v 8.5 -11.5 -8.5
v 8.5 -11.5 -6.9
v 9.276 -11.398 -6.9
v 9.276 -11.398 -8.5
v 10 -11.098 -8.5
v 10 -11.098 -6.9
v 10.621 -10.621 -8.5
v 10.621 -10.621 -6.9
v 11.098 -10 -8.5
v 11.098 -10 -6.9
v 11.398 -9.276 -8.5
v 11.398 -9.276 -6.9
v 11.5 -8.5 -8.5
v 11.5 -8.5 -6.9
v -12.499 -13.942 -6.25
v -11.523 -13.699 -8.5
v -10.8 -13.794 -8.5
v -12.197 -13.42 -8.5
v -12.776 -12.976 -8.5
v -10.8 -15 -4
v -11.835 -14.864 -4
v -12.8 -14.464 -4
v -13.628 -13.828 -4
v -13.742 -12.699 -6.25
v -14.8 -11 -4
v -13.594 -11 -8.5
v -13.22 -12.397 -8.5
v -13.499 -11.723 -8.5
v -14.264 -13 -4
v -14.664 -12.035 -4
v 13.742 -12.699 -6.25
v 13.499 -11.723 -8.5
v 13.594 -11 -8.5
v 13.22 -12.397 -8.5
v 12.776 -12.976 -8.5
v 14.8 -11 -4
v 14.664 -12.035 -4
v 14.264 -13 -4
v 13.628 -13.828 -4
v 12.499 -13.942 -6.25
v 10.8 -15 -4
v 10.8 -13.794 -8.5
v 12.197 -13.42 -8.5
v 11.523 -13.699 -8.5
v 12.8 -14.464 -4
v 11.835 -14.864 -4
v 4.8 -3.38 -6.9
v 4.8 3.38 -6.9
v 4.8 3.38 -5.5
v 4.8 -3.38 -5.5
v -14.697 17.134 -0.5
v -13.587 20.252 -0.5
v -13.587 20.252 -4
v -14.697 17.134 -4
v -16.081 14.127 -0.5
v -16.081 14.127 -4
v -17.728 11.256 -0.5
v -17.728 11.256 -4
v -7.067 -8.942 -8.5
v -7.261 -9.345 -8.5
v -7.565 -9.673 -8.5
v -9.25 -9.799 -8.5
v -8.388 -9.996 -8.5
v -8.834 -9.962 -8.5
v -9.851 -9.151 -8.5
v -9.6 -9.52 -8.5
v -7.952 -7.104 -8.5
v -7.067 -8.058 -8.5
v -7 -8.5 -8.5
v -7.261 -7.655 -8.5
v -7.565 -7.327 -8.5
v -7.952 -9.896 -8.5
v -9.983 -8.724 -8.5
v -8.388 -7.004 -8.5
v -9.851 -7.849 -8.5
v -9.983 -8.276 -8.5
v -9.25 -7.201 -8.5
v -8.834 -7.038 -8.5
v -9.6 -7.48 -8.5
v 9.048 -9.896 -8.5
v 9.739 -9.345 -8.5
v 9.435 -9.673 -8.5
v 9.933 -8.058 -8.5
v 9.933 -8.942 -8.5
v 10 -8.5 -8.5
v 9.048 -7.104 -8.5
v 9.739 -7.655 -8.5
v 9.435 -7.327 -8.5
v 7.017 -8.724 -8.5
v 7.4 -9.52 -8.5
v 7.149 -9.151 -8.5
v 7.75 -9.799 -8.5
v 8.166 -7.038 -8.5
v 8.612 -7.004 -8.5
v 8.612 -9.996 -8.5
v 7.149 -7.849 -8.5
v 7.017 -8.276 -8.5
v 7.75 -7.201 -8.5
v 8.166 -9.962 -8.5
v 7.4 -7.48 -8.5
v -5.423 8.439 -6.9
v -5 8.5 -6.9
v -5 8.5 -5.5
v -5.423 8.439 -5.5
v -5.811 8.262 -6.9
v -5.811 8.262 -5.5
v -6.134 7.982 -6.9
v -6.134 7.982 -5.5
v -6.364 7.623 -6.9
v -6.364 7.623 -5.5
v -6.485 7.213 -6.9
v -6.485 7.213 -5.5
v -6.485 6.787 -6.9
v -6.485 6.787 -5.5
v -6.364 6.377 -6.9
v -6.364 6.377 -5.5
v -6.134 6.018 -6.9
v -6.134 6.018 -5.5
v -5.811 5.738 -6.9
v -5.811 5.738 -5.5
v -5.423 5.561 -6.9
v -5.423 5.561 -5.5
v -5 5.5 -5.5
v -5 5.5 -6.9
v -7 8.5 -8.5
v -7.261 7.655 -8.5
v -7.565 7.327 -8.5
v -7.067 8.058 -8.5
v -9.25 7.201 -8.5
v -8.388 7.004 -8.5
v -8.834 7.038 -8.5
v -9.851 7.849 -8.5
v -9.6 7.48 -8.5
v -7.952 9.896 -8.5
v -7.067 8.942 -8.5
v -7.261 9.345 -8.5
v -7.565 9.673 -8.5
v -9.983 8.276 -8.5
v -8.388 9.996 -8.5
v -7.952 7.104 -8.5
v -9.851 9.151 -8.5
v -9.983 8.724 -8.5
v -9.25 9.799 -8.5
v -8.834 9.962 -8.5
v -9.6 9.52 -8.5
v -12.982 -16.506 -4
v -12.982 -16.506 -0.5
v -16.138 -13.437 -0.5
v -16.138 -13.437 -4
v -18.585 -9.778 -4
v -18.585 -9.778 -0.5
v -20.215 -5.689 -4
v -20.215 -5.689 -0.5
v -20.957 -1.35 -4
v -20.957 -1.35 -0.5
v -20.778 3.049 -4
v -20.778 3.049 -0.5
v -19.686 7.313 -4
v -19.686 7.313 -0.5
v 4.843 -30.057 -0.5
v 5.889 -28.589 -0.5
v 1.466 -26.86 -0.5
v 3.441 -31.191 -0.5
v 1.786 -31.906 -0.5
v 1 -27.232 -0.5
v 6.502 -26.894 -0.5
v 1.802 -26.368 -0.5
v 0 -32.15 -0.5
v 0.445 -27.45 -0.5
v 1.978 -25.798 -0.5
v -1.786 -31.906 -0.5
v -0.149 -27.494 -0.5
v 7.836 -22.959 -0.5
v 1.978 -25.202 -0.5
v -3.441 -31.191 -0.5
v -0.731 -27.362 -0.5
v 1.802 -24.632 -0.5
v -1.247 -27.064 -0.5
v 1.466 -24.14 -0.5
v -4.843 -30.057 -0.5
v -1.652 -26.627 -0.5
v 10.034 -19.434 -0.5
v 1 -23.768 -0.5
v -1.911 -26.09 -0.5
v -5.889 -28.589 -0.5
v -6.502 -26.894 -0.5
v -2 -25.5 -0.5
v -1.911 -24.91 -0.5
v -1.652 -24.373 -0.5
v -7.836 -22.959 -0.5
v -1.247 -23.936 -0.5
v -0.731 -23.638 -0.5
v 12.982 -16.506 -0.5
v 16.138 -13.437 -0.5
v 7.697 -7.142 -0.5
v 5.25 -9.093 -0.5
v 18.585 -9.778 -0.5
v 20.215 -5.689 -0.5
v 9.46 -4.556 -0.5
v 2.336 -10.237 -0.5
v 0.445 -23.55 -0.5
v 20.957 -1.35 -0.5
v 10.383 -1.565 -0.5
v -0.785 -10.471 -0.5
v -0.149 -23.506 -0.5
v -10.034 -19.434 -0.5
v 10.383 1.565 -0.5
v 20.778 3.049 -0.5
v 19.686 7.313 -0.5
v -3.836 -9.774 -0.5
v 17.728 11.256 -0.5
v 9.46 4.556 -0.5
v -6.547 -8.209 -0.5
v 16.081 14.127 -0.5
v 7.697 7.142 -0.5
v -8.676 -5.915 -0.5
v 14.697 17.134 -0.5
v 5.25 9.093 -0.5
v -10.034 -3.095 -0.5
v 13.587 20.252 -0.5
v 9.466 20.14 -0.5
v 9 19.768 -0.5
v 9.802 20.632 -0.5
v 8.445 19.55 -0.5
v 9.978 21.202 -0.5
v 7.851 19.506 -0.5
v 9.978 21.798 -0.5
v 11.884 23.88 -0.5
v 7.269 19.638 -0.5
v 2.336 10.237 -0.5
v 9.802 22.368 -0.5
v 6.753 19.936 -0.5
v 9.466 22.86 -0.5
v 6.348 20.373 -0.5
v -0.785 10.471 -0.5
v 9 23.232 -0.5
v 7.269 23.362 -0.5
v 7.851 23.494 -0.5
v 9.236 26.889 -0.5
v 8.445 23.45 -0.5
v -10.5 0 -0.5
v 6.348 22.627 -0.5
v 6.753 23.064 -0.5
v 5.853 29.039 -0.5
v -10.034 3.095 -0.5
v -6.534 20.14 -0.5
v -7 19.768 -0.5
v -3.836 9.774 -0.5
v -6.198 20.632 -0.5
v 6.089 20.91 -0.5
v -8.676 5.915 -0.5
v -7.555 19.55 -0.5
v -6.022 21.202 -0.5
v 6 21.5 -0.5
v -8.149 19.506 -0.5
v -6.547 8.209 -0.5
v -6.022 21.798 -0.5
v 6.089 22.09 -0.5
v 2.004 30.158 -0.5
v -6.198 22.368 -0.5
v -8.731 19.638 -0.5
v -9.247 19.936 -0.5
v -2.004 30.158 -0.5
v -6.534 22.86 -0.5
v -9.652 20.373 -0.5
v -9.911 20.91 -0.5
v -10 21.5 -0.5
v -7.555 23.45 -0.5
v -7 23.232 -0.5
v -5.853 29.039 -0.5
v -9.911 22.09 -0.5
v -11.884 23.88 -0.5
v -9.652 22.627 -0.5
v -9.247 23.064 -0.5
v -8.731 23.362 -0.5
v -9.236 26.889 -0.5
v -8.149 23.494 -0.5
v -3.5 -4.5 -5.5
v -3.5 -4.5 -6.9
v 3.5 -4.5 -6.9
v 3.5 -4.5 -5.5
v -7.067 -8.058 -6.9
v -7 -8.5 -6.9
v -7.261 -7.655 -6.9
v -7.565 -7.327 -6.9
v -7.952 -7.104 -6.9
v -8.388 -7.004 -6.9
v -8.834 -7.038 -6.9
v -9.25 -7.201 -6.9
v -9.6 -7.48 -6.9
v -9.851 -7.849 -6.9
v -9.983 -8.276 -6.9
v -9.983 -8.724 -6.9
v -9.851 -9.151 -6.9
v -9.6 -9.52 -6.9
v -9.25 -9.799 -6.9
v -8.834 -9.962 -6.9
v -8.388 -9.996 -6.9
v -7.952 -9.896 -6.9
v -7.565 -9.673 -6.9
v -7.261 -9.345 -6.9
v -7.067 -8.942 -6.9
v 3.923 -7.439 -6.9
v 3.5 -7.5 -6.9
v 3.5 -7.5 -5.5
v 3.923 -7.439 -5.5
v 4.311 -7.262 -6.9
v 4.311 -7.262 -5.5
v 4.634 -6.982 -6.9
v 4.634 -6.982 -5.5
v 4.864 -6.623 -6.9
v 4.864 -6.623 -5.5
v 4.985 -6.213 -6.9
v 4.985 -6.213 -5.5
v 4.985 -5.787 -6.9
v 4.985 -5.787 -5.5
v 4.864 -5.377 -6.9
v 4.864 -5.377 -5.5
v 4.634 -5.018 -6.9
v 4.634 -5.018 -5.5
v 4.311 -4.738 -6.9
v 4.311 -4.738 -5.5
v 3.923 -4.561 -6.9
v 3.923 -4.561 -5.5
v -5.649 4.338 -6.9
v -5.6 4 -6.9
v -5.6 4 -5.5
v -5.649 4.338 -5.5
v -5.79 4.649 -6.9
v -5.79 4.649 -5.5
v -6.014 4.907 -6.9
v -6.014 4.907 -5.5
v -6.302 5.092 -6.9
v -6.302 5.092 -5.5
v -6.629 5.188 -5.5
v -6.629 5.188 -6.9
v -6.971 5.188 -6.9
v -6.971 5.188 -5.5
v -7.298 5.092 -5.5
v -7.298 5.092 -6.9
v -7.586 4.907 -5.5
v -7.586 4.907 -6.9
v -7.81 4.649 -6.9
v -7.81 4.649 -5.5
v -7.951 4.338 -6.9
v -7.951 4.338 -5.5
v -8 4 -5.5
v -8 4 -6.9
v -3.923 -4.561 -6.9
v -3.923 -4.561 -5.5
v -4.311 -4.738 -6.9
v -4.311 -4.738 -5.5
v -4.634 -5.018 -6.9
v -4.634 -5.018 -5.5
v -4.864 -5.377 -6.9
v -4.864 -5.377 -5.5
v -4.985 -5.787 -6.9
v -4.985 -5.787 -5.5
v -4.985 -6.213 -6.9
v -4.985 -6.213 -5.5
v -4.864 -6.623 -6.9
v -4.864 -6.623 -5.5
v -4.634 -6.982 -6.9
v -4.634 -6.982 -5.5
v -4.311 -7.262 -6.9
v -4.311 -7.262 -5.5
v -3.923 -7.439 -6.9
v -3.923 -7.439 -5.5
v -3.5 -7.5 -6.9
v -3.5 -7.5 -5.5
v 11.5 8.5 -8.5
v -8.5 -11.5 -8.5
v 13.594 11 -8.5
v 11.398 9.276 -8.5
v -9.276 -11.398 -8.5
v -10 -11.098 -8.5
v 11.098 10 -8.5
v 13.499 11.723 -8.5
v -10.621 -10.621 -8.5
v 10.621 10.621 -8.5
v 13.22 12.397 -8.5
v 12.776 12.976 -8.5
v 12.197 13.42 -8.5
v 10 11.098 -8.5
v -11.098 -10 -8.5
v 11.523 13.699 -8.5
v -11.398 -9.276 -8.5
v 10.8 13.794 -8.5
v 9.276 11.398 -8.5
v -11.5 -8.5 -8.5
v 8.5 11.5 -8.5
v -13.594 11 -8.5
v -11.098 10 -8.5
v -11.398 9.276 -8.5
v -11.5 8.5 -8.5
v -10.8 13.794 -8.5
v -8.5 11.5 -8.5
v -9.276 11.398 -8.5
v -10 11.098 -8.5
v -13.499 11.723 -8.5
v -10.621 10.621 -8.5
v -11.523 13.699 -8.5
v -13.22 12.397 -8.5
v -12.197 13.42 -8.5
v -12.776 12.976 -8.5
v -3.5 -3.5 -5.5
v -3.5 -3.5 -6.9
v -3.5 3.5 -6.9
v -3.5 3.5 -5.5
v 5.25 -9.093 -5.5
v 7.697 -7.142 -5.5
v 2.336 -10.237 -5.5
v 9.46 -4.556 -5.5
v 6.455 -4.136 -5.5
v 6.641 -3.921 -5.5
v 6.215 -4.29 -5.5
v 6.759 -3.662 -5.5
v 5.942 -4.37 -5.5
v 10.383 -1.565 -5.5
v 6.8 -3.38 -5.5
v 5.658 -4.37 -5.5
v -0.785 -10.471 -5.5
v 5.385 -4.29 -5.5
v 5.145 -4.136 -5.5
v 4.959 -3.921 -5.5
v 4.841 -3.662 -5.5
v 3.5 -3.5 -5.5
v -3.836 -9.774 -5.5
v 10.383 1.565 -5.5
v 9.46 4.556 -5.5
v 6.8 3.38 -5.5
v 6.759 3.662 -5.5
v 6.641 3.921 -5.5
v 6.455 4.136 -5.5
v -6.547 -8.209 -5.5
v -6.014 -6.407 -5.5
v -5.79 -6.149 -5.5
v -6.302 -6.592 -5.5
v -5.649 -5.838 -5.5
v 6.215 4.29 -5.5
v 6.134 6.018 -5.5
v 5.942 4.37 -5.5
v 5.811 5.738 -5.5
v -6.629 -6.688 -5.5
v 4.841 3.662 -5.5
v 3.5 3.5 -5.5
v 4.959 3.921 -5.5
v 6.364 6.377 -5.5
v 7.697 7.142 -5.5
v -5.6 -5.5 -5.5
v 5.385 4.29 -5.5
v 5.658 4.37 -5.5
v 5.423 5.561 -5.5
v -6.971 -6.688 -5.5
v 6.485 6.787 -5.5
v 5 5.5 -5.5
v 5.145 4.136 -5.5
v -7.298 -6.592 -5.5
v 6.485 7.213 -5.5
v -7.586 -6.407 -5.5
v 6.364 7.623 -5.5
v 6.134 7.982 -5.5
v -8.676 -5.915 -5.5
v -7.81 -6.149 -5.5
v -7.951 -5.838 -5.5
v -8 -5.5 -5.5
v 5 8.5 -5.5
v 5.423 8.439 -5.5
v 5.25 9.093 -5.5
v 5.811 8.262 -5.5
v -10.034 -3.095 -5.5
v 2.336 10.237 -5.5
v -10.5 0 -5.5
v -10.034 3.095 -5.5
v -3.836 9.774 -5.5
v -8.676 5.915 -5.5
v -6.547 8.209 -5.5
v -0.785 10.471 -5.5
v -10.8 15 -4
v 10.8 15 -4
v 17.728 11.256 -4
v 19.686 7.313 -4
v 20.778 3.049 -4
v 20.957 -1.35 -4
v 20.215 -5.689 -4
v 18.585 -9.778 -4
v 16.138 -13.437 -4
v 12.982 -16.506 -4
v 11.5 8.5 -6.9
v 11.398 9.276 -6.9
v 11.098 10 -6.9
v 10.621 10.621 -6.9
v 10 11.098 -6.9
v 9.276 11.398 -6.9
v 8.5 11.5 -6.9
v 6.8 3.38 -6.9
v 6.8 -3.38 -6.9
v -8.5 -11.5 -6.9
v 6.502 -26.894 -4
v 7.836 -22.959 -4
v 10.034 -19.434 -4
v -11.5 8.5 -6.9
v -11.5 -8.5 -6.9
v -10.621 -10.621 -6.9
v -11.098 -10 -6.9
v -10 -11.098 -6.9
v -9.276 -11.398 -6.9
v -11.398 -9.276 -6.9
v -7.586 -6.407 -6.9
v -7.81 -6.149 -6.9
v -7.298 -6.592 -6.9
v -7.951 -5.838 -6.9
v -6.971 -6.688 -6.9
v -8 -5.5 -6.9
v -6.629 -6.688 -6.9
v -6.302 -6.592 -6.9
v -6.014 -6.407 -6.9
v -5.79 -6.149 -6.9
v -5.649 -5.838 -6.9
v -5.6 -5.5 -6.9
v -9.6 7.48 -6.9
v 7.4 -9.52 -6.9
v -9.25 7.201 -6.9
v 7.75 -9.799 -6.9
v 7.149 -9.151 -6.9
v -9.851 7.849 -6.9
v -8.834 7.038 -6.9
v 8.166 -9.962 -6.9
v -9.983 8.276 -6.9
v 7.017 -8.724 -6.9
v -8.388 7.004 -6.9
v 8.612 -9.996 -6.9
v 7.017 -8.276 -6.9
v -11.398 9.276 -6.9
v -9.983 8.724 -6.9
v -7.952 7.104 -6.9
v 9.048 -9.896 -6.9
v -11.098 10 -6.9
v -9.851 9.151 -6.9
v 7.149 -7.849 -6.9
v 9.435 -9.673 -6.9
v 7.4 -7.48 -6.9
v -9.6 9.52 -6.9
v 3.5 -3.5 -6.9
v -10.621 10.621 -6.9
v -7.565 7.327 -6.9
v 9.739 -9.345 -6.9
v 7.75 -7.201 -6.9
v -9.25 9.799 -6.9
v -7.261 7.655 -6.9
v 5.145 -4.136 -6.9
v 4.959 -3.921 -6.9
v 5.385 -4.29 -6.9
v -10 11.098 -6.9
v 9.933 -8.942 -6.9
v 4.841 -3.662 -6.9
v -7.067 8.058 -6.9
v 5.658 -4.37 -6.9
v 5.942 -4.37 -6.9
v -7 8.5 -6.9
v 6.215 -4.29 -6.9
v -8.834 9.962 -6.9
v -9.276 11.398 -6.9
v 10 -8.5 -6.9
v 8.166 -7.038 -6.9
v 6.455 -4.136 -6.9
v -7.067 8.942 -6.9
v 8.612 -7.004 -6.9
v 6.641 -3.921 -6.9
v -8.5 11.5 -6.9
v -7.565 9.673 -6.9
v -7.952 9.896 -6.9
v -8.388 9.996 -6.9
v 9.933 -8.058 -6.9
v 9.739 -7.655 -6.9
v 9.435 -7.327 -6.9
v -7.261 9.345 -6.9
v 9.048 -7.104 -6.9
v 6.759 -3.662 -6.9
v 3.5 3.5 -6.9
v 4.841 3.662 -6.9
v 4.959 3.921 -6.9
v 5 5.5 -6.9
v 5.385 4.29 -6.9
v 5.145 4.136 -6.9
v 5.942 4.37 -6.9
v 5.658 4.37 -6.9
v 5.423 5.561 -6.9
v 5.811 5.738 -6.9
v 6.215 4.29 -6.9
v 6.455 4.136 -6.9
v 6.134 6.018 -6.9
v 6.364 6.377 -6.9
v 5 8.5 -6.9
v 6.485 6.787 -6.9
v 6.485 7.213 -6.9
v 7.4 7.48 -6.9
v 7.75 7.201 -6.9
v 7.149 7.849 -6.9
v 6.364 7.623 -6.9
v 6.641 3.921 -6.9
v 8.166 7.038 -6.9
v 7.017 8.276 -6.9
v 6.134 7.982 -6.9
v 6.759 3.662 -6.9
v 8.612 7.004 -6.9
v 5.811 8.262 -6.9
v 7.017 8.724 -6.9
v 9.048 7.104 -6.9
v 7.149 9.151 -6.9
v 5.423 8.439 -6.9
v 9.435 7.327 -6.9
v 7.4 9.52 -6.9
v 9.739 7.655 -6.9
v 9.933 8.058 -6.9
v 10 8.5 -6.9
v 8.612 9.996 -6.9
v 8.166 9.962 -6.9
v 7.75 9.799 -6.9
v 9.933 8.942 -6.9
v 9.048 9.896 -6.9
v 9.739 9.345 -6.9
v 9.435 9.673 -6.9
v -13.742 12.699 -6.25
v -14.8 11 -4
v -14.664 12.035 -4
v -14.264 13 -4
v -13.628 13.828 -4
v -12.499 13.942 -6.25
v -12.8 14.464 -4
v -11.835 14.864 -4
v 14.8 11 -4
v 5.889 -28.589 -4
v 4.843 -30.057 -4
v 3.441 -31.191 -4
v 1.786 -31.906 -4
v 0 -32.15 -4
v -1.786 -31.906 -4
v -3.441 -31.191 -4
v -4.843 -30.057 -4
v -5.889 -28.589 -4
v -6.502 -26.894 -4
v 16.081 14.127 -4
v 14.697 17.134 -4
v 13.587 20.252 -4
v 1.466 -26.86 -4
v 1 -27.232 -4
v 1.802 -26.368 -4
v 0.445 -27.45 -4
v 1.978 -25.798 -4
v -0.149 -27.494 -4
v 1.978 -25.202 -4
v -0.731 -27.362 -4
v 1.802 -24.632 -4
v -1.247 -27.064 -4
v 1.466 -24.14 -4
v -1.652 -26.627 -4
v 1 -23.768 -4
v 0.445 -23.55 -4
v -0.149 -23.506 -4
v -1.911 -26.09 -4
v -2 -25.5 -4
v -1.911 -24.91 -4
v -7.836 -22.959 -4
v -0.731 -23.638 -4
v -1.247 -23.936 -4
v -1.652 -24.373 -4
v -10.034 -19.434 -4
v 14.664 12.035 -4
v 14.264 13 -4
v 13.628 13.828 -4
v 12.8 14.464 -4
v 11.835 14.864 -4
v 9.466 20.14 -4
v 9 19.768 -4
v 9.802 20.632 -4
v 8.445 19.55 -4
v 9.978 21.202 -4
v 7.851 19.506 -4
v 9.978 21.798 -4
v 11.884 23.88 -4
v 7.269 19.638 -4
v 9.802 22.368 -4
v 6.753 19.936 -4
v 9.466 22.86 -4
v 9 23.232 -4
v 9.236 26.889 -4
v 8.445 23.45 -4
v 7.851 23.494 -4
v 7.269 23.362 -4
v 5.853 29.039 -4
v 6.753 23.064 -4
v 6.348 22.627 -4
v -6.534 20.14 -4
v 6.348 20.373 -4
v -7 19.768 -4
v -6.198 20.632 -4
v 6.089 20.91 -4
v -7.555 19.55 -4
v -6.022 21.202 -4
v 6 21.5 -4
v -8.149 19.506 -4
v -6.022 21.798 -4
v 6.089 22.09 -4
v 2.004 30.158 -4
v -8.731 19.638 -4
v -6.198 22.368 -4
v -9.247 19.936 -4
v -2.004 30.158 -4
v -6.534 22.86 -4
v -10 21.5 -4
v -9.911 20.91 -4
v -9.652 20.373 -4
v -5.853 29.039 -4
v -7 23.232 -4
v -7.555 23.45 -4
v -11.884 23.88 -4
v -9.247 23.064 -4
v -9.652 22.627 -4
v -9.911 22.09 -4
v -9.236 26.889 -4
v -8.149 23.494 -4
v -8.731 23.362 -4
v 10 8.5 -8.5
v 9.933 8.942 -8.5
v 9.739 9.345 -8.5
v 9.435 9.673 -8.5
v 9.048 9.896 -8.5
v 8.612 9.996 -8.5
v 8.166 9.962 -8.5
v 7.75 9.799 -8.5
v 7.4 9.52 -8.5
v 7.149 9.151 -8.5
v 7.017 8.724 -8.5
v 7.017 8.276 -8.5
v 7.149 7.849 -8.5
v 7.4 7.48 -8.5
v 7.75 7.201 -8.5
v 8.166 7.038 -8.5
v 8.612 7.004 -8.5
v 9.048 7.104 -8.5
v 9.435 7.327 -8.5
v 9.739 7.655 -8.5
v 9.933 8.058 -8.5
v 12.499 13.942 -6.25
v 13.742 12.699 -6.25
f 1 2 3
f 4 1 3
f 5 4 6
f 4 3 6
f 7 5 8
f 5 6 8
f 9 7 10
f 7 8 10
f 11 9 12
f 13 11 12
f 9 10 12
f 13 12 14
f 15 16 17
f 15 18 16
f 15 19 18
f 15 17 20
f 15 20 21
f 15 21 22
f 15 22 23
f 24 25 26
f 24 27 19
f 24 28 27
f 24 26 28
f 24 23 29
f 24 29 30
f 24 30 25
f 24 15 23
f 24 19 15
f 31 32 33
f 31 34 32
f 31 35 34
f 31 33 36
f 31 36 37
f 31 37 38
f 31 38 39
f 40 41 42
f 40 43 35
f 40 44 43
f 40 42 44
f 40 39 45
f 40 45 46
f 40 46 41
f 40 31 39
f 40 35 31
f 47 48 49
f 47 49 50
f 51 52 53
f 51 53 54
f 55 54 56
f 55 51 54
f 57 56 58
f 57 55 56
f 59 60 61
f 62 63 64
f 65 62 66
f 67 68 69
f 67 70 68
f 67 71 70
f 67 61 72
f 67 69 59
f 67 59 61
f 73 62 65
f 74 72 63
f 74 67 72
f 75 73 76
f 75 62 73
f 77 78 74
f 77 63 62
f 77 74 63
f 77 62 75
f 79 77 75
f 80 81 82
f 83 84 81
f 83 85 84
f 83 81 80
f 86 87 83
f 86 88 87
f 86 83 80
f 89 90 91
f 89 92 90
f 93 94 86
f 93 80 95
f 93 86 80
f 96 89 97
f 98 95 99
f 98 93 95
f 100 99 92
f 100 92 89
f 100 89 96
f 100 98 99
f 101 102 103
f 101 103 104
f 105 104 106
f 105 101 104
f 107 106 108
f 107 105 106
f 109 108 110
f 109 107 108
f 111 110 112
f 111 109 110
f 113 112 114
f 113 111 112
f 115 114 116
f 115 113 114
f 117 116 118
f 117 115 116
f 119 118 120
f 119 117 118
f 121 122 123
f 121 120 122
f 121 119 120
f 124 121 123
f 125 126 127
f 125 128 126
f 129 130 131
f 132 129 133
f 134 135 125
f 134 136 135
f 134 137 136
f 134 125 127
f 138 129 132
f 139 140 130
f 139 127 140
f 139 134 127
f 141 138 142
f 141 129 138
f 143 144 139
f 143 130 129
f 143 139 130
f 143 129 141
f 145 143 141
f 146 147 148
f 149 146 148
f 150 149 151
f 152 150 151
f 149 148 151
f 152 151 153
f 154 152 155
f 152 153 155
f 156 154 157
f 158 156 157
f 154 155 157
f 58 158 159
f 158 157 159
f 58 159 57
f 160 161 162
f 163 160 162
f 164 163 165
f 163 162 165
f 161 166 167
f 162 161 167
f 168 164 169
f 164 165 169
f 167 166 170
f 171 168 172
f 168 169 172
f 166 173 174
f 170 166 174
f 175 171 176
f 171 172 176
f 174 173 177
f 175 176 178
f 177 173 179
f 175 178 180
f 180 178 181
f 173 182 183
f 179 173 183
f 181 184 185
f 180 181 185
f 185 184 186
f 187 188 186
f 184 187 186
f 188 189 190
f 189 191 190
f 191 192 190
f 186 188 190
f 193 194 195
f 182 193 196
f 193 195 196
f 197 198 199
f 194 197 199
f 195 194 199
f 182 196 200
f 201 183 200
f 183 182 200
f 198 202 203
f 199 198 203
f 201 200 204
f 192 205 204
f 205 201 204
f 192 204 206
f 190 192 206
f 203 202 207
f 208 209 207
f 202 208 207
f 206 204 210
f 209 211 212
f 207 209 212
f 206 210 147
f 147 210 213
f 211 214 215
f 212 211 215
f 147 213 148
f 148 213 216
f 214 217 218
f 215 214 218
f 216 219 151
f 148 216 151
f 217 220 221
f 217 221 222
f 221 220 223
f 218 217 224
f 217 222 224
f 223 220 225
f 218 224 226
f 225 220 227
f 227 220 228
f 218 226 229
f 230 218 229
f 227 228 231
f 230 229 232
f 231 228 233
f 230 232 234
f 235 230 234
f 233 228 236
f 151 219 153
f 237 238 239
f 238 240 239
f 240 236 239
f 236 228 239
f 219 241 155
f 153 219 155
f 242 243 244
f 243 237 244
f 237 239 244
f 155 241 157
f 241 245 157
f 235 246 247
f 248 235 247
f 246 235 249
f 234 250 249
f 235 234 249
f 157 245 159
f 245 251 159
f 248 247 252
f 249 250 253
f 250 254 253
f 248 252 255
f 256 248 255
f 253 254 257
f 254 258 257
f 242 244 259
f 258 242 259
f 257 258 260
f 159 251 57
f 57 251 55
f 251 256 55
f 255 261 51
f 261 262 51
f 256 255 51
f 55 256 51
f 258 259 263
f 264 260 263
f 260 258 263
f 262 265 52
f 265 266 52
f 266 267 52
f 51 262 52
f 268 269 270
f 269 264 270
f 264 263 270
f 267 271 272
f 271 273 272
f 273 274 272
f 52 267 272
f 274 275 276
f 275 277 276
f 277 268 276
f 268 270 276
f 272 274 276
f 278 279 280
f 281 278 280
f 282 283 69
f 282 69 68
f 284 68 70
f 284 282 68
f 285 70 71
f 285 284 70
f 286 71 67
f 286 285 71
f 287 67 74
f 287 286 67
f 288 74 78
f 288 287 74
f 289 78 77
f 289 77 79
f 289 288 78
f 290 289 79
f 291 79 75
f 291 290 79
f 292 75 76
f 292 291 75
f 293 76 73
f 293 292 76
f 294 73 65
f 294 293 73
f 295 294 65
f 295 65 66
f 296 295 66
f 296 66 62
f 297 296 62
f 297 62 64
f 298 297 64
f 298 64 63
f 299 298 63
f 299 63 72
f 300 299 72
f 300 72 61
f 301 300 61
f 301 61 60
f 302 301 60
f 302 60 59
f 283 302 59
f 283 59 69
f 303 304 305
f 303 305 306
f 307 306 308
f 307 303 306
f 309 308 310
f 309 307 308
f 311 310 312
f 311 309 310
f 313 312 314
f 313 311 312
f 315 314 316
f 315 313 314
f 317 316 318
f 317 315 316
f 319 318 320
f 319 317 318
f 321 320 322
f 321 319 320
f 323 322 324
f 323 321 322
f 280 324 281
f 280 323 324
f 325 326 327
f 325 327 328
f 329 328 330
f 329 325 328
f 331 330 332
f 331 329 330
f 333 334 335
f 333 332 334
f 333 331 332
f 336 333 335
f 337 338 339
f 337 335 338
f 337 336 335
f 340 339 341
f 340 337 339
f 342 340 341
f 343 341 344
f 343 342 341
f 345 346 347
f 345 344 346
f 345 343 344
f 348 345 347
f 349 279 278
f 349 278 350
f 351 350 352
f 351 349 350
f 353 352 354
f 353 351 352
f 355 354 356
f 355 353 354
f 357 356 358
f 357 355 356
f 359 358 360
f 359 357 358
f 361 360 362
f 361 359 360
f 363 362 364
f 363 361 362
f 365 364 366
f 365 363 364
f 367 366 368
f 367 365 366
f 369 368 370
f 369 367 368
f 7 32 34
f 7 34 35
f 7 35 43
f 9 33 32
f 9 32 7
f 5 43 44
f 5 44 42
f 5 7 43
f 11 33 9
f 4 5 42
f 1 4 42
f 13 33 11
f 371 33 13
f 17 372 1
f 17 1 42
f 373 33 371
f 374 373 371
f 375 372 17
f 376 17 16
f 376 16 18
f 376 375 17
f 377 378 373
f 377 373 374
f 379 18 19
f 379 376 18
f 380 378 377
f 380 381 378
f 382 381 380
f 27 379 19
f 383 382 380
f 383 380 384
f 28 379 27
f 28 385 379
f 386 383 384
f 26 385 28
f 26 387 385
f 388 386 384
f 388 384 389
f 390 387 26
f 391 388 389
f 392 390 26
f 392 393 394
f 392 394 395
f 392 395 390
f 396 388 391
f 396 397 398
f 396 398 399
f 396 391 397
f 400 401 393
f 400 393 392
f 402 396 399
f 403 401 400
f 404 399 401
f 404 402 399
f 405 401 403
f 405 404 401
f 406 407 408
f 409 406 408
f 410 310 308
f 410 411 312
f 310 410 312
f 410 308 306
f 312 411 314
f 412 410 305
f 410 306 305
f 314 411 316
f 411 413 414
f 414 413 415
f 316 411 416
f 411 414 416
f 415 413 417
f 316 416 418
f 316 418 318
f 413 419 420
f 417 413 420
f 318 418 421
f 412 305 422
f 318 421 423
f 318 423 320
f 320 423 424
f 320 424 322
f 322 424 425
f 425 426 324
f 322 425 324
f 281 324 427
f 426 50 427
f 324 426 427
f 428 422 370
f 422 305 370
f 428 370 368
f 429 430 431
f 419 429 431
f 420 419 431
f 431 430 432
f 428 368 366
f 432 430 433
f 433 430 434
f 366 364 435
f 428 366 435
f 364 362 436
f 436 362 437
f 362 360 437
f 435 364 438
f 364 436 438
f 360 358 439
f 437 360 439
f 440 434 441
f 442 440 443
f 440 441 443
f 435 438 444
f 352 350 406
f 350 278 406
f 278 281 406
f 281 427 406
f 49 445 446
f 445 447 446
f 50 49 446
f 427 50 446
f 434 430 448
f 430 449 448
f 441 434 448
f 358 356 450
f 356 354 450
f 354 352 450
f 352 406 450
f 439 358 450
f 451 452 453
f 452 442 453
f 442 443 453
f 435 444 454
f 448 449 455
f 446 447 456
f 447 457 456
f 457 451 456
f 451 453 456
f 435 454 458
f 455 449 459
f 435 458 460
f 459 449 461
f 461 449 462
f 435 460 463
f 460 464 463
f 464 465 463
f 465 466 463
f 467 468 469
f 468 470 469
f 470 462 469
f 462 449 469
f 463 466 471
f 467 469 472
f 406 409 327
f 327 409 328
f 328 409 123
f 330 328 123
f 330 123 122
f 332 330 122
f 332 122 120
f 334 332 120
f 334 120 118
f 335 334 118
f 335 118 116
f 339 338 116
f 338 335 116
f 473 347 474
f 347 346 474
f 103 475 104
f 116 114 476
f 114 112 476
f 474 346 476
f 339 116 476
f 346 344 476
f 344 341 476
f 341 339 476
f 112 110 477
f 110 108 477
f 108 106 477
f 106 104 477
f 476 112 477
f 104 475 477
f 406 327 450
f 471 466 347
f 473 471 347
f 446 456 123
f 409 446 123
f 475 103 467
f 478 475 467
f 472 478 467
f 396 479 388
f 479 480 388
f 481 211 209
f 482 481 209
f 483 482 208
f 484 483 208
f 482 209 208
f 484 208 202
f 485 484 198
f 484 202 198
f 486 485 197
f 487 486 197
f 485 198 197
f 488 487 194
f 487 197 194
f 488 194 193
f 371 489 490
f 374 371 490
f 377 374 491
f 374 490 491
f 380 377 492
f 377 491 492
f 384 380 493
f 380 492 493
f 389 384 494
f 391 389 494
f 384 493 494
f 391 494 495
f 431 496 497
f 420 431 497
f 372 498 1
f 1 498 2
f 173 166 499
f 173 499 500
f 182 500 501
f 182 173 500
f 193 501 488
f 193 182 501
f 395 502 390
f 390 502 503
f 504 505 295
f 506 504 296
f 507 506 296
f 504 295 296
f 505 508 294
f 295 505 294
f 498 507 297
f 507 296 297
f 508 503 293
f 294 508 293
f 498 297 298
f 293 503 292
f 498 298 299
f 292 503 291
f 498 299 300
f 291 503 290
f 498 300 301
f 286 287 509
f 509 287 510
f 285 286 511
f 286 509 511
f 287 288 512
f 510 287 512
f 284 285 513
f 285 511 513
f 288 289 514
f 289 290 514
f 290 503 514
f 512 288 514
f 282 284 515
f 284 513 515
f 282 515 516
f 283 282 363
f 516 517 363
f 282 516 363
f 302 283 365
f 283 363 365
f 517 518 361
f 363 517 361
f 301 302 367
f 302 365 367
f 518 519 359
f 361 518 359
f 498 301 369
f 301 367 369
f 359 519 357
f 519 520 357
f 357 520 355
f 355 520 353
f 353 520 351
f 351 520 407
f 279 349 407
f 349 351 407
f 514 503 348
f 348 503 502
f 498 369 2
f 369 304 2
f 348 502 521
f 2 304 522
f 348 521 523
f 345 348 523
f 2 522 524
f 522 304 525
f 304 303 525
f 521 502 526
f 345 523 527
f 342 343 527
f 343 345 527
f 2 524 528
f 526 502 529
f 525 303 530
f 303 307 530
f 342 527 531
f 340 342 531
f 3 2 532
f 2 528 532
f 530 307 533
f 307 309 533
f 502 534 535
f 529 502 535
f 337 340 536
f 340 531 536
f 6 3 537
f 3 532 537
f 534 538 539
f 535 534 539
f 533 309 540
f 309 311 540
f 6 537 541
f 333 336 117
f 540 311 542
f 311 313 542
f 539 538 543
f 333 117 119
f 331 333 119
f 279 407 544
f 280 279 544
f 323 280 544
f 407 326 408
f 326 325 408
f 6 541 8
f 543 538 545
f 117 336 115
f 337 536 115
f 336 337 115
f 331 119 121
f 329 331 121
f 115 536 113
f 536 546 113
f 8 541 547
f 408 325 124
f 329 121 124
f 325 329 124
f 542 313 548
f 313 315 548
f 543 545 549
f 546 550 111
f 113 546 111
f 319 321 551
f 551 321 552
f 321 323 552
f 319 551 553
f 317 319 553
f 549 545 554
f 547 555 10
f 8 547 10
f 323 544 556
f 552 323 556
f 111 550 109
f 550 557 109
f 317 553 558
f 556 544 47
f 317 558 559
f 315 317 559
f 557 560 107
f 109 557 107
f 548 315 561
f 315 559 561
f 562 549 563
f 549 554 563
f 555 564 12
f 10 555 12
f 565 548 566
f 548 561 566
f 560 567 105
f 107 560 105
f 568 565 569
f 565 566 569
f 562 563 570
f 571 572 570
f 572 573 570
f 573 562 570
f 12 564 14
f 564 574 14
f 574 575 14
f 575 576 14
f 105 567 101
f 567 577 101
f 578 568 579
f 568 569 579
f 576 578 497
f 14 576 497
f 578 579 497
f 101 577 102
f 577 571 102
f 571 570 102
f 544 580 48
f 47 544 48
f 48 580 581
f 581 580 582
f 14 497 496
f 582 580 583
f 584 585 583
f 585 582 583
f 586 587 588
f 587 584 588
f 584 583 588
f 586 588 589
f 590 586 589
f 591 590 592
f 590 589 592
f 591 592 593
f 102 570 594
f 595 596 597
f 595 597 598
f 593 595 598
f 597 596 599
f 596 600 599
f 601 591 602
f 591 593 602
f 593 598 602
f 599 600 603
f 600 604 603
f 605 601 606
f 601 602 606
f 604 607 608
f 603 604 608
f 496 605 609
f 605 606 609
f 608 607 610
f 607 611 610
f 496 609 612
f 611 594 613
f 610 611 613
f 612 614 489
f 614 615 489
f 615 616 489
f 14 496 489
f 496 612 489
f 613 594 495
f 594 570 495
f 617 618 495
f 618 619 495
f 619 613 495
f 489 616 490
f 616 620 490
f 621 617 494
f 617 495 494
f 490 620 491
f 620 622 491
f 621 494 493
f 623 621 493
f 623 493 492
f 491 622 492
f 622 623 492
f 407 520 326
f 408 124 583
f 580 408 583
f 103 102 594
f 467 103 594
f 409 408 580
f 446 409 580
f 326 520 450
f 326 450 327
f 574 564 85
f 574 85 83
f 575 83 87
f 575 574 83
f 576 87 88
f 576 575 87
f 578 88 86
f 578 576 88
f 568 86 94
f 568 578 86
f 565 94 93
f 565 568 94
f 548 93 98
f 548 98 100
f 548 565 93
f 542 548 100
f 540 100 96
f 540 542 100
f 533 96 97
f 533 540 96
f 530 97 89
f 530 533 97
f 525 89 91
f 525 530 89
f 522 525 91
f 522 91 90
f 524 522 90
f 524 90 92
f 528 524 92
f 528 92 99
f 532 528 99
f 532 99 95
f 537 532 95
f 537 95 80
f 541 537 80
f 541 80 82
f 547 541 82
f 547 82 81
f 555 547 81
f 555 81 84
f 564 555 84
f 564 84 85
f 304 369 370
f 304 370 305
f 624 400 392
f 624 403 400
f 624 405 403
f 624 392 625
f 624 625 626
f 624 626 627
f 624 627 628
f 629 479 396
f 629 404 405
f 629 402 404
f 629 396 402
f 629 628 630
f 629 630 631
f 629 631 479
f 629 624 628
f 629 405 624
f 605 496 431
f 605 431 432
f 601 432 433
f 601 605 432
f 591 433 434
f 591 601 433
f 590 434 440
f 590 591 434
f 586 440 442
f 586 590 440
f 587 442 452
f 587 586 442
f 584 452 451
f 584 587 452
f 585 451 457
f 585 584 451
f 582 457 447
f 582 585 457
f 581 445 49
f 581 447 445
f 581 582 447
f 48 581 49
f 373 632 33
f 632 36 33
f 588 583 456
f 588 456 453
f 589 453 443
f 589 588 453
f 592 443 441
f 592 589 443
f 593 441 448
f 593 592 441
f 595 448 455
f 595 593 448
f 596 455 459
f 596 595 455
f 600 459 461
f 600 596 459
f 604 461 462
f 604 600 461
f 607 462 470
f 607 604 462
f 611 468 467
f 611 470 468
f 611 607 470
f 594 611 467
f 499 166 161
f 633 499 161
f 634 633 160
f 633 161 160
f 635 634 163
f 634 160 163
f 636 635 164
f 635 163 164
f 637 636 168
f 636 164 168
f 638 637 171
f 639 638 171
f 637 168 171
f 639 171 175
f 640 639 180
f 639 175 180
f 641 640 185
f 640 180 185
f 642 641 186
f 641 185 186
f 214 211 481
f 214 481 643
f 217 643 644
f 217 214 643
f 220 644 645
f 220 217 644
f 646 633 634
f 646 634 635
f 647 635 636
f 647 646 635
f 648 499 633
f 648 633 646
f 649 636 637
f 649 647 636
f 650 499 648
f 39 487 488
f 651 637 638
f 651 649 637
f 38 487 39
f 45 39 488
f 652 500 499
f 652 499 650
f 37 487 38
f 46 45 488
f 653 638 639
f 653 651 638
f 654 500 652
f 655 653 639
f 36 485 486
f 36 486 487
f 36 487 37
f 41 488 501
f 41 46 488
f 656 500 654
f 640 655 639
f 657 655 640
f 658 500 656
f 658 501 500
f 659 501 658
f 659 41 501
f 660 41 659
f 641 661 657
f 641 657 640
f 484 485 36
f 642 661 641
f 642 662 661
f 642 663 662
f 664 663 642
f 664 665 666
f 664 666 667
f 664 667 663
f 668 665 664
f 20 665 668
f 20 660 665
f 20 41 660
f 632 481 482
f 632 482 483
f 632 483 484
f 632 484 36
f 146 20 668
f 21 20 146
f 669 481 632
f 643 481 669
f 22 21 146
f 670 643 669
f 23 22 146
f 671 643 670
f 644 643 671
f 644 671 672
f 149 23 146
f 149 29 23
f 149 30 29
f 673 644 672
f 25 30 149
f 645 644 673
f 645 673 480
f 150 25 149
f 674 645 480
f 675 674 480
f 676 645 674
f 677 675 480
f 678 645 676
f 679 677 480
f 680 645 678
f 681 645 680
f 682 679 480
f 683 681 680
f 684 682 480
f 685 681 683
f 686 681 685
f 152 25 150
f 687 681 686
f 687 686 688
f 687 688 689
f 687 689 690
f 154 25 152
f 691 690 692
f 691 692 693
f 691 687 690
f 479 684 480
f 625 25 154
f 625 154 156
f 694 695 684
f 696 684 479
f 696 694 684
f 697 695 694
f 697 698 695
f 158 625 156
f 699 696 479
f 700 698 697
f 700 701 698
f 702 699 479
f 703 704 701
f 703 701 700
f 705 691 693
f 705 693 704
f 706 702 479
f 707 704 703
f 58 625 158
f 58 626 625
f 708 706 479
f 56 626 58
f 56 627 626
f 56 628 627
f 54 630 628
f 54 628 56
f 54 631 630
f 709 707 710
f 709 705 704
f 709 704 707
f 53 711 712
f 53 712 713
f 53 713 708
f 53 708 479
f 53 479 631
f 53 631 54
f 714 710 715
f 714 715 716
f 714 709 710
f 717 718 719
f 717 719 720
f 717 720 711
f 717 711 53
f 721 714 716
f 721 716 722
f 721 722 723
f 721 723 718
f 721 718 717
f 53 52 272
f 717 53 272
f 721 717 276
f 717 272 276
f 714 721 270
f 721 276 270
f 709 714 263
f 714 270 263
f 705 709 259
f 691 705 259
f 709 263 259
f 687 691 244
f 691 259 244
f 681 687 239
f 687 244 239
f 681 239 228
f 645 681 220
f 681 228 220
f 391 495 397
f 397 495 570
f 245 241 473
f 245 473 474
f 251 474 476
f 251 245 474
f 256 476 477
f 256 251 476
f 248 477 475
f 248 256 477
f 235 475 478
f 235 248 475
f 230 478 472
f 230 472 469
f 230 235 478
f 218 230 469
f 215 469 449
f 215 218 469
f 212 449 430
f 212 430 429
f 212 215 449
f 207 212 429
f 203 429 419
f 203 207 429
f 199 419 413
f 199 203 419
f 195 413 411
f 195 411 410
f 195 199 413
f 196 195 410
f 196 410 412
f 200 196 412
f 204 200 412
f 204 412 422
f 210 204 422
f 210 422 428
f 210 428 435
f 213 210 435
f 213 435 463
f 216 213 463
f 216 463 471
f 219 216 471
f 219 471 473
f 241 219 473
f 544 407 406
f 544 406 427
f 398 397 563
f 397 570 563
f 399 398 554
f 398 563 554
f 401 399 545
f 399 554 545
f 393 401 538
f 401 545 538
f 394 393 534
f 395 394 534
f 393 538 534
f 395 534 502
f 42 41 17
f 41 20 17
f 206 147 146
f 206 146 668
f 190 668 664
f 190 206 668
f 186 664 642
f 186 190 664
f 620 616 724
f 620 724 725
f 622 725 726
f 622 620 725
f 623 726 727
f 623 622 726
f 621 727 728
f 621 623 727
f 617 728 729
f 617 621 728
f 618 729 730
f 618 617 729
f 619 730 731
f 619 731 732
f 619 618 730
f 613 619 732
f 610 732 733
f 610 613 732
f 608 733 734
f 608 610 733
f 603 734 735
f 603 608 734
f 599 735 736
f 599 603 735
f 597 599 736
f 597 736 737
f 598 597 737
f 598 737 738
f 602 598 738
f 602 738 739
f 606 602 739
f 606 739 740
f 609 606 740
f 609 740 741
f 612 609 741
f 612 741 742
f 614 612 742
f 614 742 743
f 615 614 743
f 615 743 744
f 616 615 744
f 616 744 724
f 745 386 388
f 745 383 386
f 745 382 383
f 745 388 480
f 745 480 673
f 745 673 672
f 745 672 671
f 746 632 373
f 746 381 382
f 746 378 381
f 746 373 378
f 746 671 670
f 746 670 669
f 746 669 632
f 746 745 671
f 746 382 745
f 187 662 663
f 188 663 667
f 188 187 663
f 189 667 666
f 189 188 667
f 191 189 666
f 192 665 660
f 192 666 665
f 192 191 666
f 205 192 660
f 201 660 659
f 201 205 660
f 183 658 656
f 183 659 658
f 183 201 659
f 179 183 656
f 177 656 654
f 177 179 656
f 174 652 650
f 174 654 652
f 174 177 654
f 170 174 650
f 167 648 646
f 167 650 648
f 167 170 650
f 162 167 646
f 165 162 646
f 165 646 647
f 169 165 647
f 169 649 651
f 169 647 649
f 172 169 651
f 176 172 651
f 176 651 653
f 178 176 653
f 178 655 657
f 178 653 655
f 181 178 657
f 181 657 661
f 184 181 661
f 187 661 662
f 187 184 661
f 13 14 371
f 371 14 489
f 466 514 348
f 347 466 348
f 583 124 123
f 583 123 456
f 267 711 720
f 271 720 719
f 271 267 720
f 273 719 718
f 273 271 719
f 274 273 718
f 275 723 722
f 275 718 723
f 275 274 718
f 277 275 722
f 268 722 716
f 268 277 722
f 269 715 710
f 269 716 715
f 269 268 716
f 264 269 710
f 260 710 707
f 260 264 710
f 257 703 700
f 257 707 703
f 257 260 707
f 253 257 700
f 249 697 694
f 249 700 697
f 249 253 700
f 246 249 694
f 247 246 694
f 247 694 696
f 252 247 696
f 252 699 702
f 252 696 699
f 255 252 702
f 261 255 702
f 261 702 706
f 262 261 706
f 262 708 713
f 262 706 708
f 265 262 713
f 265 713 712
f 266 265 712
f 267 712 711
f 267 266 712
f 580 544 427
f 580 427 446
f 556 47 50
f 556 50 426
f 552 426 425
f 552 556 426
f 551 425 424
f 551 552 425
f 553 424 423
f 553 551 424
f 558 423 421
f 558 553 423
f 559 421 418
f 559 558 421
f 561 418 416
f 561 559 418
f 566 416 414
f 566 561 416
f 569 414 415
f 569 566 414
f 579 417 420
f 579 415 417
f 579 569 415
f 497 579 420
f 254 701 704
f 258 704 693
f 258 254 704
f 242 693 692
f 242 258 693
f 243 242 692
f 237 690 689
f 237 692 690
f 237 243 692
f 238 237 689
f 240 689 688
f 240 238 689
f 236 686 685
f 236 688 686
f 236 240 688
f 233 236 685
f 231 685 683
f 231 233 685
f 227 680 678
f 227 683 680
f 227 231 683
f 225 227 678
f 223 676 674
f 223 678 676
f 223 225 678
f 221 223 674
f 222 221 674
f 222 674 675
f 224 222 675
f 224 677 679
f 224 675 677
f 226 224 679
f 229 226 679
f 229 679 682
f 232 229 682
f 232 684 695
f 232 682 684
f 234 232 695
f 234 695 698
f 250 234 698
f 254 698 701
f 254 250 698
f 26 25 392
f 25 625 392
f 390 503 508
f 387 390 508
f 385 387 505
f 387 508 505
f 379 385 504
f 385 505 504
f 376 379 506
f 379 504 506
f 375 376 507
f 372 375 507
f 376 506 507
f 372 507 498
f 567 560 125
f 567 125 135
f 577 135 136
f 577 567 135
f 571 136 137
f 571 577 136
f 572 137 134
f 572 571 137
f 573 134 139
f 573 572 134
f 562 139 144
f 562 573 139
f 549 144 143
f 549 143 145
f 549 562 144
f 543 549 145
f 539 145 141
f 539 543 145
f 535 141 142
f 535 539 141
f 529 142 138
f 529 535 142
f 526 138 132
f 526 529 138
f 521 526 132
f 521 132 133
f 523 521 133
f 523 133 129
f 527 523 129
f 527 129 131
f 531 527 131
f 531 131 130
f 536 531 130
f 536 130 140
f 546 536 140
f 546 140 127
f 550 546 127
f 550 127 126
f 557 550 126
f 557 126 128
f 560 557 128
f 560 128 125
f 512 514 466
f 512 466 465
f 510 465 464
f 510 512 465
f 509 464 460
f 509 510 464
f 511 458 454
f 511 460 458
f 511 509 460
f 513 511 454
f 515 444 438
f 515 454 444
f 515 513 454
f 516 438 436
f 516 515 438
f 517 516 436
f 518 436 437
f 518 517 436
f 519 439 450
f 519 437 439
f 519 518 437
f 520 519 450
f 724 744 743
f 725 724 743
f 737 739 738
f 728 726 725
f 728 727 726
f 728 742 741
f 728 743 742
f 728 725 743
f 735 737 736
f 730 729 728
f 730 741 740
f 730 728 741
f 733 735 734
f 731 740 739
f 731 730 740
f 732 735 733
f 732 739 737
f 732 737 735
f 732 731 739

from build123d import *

# Parameters (mm, degrees)
PAD015_DEPTH            = 0.8
SKETCH029_W             = 7
SKETCH029_H             = 7
PAD017_DEPTH            = 1.5
SKETCH028_R             = 1.5
HOLE008_DEPTH           = 25
SKETCH022_R             = 10.5
PAD020_DEPTH            = 3.5
PAD021_DEPTH            = 4.5
PAD021_TAPER            = 15
SKETCH023_R             = 2
HOLE010_DEPTH           = 25
SKETCH036_R             = 10.5
POCKET003_DEPTH         = 5
BODY009_PLACEMENT_ANGLE = 180


with BuildPart() as as5600:
    # Sketch027 → Pad015 (new body, symmetric)
    with BuildSketch(Plane.XY):
        with BuildLine():
            Line((-11.5, 8.5), (-11.5, -8.5))
            ThreePointArc((-11.5, -8.5), (-10.62132, -10.62132), (-8.5, -11.5))
            Line((-8.5, -11.5), (8.5, -11.5))
            ThreePointArc((8.5, -11.5), (10.62132, -10.62132), (11.5, -8.5))
            Line((11.5, -8.5), (11.5, 8.5))
            ThreePointArc((11.5, 8.5), (10.62132, 10.62132), (8.5, 11.5))
            Line((8.5, 11.5), (-8.5, 11.5))
            ThreePointArc((-8.5, 11.5), (-10.62132, 10.62132), (-11.5, 8.5))
        make_face()
    extrude(amount=PAD015_DEPTH, both=True)

    # Sketch029 → Pad017 (join)
    with BuildSketch(Plane.XY.offset(0.8)):
        with BuildLine():
            ThreePointArc((-5, 8.5), (-6.5, 7), (-5, 5.5))
            Line((-5, 5.5), (5, 5.5))
            ThreePointArc((5, 5.5), (6.5, 7), (5, 8.5))
            Line((-5, 8.5), (5, 8.5))
        make_face()
        with BuildLine():
            ThreePointArc((-3.5, -4.5), (-5, -6), (-3.5, -7.5))
            Line((-3.5, -7.5), (3.5, -7.5))
            ThreePointArc((3.5, -7.5), (5, -6), (3.5, -4.5))
            Line((-3.5, -4.5), (3.5, -4.5))
        make_face()
        Rectangle(SKETCH029_W, SKETCH029_H)
        with BuildLine():
            ThreePointArc((-8, -5.5), (-6.8, -6.7), (-5.6, -5.5))
            Line((-5.6, -5.5), (-5.6, 4))
            ThreePointArc((-5.6, 4), (-6.8, 5.2), (-8, 4))
            Line((-8, -5.5), (-8, 4))
        make_face()
        with BuildLine():
            ThreePointArc((6.8, 3.38), (5.8, 4.38), (4.8, 3.38))
            Line((4.8, 3.38), (4.8, -3.38))
            ThreePointArc((4.8, -3.38), (5.8, -4.38), (6.8, -3.38))
            Line((6.8, 3.38), (6.8, -3.38))
        make_face()
    extrude(amount=PAD017_DEPTH)

    # Sketch028 (on Face10 of Pad015) → Hole008 (cut)
    with BuildSketch(Plane.XY.offset(0.8)):
        with Locations((-8.5, 8.5)):
            Circle(SKETCH028_R)
        with Locations((8.5, 8.5)):
            Circle(SKETCH028_R)
        with Locations((-8.5, -8.5)):
            Circle(SKETCH028_R)
        with Locations((8.5, -8.5)):
            Circle(SKETCH028_R)
    extrude(amount=-HOLE008_DEPTH, mode=Mode.SUBTRACT)


with BuildPart() as as5600_1:
    # Body001 placement: moved
    add(as5600.part.moved(Location((0, 0, -7.7))))


with BuildPart() as holderas5600:
    # Sketch022 → Pad020 (new body)
    with BuildSketch(Plane.XY):
        with BuildLine():
            ThreePointArc((13.586881, 20.251823), (0, 30.3), (-13.586881, 20.251823))
            ThreePointArc((-17.728491, 11.256137), (-15.355357, 15.614788), (-13.586881, 20.251823))
            ThreePointArc((-17.728491, 11.256137), (-20.699674, -3.538854), (-12.982142, -16.506483))
            ThreePointArc((-6.502297, -26.893782), (-8.833051, -21.132971), (-12.982142, -16.506483))
            ThreePointArc((-6.502297, -26.893782), (0, -32.15), (6.502297, -26.893782))
            ThreePointArc((12.982142, -16.506483), (8.833051, -21.132971), (6.502297, -26.893782))
            ThreePointArc((12.982142, -16.506483), (20.699674, -3.538854), (17.728491, 11.256137))
            ThreePointArc((13.586881, 20.251823), (15.355357, 15.614788), (17.728491, 11.256137))
        make_face()
        Circle(SKETCH022_R, mode=Mode.SUBTRACT)
    extrude(amount=PAD020_DEPTH)

    # Sketch026 (on Face11 of Pad020) → Pad021 (join)
    with BuildSketch(Plane.XY.offset(3.5)):
        with BuildLine():
            Line((-14.8, 11), (-14.8, -11))
            ThreePointArc((-14.8, -11), (-13.628427, -13.828427), (-10.8, -15))
            Line((-10.8, -15), (10.8, -15))
            ThreePointArc((10.8, -15), (13.628427, -13.828427), (14.8, -11))
            Line((14.8, -11), (14.8, 11))
            ThreePointArc((14.8, 11), (13.628427, 13.828427), (10.8, 15))
            Line((10.8, 15), (-10.8, 15))
            ThreePointArc((-10.8, 15), (-13.628427, 13.828427), (-14.8, 11))
        make_face()
    extrude(amount=PAD021_DEPTH, taper=PAD021_TAPER)

    # Sketch023 → Hole010 (cut)
    with BuildSketch(Plane.XY):
        with Locations((0, -25.5)):
            Circle(SKETCH023_R)
        with Locations((-8, 21.5)):
            Circle(SKETCH023_R)
        with Locations((8, 21.5)):
            Circle(SKETCH023_R)
        with Locations((0, -25.5)):
            Circle(SKETCH023_R)
        with Locations((-8, 21.5)):
            Circle(SKETCH023_R)
        with Locations((8, 21.5)):
            Circle(SKETCH023_R)
    extrude(amount=HOLE010_DEPTH, mode=Mode.SUBTRACT)

    # Sketch036 → Pocket003 (cut)
    with BuildSketch(Plane.XY):
        Circle(SKETCH036_R)
    extrude(amount=POCKET003_DEPTH, mode=Mode.SUBTRACT)


with BuildPart() as holderas5600_1:
    # Body009 placement: moved
    add(holderas5600.part.moved(Location((0, 0, -0.5))).rotate(Axis((0, 0, -0.5), (0, 1, 0)), BODY009_PLACEMENT_ANGLE))

    # Cut009: cut AS5600
    add(as5600_1.part, mode=Mode.SUBTRACT)


solid = holderas5600_1.part
